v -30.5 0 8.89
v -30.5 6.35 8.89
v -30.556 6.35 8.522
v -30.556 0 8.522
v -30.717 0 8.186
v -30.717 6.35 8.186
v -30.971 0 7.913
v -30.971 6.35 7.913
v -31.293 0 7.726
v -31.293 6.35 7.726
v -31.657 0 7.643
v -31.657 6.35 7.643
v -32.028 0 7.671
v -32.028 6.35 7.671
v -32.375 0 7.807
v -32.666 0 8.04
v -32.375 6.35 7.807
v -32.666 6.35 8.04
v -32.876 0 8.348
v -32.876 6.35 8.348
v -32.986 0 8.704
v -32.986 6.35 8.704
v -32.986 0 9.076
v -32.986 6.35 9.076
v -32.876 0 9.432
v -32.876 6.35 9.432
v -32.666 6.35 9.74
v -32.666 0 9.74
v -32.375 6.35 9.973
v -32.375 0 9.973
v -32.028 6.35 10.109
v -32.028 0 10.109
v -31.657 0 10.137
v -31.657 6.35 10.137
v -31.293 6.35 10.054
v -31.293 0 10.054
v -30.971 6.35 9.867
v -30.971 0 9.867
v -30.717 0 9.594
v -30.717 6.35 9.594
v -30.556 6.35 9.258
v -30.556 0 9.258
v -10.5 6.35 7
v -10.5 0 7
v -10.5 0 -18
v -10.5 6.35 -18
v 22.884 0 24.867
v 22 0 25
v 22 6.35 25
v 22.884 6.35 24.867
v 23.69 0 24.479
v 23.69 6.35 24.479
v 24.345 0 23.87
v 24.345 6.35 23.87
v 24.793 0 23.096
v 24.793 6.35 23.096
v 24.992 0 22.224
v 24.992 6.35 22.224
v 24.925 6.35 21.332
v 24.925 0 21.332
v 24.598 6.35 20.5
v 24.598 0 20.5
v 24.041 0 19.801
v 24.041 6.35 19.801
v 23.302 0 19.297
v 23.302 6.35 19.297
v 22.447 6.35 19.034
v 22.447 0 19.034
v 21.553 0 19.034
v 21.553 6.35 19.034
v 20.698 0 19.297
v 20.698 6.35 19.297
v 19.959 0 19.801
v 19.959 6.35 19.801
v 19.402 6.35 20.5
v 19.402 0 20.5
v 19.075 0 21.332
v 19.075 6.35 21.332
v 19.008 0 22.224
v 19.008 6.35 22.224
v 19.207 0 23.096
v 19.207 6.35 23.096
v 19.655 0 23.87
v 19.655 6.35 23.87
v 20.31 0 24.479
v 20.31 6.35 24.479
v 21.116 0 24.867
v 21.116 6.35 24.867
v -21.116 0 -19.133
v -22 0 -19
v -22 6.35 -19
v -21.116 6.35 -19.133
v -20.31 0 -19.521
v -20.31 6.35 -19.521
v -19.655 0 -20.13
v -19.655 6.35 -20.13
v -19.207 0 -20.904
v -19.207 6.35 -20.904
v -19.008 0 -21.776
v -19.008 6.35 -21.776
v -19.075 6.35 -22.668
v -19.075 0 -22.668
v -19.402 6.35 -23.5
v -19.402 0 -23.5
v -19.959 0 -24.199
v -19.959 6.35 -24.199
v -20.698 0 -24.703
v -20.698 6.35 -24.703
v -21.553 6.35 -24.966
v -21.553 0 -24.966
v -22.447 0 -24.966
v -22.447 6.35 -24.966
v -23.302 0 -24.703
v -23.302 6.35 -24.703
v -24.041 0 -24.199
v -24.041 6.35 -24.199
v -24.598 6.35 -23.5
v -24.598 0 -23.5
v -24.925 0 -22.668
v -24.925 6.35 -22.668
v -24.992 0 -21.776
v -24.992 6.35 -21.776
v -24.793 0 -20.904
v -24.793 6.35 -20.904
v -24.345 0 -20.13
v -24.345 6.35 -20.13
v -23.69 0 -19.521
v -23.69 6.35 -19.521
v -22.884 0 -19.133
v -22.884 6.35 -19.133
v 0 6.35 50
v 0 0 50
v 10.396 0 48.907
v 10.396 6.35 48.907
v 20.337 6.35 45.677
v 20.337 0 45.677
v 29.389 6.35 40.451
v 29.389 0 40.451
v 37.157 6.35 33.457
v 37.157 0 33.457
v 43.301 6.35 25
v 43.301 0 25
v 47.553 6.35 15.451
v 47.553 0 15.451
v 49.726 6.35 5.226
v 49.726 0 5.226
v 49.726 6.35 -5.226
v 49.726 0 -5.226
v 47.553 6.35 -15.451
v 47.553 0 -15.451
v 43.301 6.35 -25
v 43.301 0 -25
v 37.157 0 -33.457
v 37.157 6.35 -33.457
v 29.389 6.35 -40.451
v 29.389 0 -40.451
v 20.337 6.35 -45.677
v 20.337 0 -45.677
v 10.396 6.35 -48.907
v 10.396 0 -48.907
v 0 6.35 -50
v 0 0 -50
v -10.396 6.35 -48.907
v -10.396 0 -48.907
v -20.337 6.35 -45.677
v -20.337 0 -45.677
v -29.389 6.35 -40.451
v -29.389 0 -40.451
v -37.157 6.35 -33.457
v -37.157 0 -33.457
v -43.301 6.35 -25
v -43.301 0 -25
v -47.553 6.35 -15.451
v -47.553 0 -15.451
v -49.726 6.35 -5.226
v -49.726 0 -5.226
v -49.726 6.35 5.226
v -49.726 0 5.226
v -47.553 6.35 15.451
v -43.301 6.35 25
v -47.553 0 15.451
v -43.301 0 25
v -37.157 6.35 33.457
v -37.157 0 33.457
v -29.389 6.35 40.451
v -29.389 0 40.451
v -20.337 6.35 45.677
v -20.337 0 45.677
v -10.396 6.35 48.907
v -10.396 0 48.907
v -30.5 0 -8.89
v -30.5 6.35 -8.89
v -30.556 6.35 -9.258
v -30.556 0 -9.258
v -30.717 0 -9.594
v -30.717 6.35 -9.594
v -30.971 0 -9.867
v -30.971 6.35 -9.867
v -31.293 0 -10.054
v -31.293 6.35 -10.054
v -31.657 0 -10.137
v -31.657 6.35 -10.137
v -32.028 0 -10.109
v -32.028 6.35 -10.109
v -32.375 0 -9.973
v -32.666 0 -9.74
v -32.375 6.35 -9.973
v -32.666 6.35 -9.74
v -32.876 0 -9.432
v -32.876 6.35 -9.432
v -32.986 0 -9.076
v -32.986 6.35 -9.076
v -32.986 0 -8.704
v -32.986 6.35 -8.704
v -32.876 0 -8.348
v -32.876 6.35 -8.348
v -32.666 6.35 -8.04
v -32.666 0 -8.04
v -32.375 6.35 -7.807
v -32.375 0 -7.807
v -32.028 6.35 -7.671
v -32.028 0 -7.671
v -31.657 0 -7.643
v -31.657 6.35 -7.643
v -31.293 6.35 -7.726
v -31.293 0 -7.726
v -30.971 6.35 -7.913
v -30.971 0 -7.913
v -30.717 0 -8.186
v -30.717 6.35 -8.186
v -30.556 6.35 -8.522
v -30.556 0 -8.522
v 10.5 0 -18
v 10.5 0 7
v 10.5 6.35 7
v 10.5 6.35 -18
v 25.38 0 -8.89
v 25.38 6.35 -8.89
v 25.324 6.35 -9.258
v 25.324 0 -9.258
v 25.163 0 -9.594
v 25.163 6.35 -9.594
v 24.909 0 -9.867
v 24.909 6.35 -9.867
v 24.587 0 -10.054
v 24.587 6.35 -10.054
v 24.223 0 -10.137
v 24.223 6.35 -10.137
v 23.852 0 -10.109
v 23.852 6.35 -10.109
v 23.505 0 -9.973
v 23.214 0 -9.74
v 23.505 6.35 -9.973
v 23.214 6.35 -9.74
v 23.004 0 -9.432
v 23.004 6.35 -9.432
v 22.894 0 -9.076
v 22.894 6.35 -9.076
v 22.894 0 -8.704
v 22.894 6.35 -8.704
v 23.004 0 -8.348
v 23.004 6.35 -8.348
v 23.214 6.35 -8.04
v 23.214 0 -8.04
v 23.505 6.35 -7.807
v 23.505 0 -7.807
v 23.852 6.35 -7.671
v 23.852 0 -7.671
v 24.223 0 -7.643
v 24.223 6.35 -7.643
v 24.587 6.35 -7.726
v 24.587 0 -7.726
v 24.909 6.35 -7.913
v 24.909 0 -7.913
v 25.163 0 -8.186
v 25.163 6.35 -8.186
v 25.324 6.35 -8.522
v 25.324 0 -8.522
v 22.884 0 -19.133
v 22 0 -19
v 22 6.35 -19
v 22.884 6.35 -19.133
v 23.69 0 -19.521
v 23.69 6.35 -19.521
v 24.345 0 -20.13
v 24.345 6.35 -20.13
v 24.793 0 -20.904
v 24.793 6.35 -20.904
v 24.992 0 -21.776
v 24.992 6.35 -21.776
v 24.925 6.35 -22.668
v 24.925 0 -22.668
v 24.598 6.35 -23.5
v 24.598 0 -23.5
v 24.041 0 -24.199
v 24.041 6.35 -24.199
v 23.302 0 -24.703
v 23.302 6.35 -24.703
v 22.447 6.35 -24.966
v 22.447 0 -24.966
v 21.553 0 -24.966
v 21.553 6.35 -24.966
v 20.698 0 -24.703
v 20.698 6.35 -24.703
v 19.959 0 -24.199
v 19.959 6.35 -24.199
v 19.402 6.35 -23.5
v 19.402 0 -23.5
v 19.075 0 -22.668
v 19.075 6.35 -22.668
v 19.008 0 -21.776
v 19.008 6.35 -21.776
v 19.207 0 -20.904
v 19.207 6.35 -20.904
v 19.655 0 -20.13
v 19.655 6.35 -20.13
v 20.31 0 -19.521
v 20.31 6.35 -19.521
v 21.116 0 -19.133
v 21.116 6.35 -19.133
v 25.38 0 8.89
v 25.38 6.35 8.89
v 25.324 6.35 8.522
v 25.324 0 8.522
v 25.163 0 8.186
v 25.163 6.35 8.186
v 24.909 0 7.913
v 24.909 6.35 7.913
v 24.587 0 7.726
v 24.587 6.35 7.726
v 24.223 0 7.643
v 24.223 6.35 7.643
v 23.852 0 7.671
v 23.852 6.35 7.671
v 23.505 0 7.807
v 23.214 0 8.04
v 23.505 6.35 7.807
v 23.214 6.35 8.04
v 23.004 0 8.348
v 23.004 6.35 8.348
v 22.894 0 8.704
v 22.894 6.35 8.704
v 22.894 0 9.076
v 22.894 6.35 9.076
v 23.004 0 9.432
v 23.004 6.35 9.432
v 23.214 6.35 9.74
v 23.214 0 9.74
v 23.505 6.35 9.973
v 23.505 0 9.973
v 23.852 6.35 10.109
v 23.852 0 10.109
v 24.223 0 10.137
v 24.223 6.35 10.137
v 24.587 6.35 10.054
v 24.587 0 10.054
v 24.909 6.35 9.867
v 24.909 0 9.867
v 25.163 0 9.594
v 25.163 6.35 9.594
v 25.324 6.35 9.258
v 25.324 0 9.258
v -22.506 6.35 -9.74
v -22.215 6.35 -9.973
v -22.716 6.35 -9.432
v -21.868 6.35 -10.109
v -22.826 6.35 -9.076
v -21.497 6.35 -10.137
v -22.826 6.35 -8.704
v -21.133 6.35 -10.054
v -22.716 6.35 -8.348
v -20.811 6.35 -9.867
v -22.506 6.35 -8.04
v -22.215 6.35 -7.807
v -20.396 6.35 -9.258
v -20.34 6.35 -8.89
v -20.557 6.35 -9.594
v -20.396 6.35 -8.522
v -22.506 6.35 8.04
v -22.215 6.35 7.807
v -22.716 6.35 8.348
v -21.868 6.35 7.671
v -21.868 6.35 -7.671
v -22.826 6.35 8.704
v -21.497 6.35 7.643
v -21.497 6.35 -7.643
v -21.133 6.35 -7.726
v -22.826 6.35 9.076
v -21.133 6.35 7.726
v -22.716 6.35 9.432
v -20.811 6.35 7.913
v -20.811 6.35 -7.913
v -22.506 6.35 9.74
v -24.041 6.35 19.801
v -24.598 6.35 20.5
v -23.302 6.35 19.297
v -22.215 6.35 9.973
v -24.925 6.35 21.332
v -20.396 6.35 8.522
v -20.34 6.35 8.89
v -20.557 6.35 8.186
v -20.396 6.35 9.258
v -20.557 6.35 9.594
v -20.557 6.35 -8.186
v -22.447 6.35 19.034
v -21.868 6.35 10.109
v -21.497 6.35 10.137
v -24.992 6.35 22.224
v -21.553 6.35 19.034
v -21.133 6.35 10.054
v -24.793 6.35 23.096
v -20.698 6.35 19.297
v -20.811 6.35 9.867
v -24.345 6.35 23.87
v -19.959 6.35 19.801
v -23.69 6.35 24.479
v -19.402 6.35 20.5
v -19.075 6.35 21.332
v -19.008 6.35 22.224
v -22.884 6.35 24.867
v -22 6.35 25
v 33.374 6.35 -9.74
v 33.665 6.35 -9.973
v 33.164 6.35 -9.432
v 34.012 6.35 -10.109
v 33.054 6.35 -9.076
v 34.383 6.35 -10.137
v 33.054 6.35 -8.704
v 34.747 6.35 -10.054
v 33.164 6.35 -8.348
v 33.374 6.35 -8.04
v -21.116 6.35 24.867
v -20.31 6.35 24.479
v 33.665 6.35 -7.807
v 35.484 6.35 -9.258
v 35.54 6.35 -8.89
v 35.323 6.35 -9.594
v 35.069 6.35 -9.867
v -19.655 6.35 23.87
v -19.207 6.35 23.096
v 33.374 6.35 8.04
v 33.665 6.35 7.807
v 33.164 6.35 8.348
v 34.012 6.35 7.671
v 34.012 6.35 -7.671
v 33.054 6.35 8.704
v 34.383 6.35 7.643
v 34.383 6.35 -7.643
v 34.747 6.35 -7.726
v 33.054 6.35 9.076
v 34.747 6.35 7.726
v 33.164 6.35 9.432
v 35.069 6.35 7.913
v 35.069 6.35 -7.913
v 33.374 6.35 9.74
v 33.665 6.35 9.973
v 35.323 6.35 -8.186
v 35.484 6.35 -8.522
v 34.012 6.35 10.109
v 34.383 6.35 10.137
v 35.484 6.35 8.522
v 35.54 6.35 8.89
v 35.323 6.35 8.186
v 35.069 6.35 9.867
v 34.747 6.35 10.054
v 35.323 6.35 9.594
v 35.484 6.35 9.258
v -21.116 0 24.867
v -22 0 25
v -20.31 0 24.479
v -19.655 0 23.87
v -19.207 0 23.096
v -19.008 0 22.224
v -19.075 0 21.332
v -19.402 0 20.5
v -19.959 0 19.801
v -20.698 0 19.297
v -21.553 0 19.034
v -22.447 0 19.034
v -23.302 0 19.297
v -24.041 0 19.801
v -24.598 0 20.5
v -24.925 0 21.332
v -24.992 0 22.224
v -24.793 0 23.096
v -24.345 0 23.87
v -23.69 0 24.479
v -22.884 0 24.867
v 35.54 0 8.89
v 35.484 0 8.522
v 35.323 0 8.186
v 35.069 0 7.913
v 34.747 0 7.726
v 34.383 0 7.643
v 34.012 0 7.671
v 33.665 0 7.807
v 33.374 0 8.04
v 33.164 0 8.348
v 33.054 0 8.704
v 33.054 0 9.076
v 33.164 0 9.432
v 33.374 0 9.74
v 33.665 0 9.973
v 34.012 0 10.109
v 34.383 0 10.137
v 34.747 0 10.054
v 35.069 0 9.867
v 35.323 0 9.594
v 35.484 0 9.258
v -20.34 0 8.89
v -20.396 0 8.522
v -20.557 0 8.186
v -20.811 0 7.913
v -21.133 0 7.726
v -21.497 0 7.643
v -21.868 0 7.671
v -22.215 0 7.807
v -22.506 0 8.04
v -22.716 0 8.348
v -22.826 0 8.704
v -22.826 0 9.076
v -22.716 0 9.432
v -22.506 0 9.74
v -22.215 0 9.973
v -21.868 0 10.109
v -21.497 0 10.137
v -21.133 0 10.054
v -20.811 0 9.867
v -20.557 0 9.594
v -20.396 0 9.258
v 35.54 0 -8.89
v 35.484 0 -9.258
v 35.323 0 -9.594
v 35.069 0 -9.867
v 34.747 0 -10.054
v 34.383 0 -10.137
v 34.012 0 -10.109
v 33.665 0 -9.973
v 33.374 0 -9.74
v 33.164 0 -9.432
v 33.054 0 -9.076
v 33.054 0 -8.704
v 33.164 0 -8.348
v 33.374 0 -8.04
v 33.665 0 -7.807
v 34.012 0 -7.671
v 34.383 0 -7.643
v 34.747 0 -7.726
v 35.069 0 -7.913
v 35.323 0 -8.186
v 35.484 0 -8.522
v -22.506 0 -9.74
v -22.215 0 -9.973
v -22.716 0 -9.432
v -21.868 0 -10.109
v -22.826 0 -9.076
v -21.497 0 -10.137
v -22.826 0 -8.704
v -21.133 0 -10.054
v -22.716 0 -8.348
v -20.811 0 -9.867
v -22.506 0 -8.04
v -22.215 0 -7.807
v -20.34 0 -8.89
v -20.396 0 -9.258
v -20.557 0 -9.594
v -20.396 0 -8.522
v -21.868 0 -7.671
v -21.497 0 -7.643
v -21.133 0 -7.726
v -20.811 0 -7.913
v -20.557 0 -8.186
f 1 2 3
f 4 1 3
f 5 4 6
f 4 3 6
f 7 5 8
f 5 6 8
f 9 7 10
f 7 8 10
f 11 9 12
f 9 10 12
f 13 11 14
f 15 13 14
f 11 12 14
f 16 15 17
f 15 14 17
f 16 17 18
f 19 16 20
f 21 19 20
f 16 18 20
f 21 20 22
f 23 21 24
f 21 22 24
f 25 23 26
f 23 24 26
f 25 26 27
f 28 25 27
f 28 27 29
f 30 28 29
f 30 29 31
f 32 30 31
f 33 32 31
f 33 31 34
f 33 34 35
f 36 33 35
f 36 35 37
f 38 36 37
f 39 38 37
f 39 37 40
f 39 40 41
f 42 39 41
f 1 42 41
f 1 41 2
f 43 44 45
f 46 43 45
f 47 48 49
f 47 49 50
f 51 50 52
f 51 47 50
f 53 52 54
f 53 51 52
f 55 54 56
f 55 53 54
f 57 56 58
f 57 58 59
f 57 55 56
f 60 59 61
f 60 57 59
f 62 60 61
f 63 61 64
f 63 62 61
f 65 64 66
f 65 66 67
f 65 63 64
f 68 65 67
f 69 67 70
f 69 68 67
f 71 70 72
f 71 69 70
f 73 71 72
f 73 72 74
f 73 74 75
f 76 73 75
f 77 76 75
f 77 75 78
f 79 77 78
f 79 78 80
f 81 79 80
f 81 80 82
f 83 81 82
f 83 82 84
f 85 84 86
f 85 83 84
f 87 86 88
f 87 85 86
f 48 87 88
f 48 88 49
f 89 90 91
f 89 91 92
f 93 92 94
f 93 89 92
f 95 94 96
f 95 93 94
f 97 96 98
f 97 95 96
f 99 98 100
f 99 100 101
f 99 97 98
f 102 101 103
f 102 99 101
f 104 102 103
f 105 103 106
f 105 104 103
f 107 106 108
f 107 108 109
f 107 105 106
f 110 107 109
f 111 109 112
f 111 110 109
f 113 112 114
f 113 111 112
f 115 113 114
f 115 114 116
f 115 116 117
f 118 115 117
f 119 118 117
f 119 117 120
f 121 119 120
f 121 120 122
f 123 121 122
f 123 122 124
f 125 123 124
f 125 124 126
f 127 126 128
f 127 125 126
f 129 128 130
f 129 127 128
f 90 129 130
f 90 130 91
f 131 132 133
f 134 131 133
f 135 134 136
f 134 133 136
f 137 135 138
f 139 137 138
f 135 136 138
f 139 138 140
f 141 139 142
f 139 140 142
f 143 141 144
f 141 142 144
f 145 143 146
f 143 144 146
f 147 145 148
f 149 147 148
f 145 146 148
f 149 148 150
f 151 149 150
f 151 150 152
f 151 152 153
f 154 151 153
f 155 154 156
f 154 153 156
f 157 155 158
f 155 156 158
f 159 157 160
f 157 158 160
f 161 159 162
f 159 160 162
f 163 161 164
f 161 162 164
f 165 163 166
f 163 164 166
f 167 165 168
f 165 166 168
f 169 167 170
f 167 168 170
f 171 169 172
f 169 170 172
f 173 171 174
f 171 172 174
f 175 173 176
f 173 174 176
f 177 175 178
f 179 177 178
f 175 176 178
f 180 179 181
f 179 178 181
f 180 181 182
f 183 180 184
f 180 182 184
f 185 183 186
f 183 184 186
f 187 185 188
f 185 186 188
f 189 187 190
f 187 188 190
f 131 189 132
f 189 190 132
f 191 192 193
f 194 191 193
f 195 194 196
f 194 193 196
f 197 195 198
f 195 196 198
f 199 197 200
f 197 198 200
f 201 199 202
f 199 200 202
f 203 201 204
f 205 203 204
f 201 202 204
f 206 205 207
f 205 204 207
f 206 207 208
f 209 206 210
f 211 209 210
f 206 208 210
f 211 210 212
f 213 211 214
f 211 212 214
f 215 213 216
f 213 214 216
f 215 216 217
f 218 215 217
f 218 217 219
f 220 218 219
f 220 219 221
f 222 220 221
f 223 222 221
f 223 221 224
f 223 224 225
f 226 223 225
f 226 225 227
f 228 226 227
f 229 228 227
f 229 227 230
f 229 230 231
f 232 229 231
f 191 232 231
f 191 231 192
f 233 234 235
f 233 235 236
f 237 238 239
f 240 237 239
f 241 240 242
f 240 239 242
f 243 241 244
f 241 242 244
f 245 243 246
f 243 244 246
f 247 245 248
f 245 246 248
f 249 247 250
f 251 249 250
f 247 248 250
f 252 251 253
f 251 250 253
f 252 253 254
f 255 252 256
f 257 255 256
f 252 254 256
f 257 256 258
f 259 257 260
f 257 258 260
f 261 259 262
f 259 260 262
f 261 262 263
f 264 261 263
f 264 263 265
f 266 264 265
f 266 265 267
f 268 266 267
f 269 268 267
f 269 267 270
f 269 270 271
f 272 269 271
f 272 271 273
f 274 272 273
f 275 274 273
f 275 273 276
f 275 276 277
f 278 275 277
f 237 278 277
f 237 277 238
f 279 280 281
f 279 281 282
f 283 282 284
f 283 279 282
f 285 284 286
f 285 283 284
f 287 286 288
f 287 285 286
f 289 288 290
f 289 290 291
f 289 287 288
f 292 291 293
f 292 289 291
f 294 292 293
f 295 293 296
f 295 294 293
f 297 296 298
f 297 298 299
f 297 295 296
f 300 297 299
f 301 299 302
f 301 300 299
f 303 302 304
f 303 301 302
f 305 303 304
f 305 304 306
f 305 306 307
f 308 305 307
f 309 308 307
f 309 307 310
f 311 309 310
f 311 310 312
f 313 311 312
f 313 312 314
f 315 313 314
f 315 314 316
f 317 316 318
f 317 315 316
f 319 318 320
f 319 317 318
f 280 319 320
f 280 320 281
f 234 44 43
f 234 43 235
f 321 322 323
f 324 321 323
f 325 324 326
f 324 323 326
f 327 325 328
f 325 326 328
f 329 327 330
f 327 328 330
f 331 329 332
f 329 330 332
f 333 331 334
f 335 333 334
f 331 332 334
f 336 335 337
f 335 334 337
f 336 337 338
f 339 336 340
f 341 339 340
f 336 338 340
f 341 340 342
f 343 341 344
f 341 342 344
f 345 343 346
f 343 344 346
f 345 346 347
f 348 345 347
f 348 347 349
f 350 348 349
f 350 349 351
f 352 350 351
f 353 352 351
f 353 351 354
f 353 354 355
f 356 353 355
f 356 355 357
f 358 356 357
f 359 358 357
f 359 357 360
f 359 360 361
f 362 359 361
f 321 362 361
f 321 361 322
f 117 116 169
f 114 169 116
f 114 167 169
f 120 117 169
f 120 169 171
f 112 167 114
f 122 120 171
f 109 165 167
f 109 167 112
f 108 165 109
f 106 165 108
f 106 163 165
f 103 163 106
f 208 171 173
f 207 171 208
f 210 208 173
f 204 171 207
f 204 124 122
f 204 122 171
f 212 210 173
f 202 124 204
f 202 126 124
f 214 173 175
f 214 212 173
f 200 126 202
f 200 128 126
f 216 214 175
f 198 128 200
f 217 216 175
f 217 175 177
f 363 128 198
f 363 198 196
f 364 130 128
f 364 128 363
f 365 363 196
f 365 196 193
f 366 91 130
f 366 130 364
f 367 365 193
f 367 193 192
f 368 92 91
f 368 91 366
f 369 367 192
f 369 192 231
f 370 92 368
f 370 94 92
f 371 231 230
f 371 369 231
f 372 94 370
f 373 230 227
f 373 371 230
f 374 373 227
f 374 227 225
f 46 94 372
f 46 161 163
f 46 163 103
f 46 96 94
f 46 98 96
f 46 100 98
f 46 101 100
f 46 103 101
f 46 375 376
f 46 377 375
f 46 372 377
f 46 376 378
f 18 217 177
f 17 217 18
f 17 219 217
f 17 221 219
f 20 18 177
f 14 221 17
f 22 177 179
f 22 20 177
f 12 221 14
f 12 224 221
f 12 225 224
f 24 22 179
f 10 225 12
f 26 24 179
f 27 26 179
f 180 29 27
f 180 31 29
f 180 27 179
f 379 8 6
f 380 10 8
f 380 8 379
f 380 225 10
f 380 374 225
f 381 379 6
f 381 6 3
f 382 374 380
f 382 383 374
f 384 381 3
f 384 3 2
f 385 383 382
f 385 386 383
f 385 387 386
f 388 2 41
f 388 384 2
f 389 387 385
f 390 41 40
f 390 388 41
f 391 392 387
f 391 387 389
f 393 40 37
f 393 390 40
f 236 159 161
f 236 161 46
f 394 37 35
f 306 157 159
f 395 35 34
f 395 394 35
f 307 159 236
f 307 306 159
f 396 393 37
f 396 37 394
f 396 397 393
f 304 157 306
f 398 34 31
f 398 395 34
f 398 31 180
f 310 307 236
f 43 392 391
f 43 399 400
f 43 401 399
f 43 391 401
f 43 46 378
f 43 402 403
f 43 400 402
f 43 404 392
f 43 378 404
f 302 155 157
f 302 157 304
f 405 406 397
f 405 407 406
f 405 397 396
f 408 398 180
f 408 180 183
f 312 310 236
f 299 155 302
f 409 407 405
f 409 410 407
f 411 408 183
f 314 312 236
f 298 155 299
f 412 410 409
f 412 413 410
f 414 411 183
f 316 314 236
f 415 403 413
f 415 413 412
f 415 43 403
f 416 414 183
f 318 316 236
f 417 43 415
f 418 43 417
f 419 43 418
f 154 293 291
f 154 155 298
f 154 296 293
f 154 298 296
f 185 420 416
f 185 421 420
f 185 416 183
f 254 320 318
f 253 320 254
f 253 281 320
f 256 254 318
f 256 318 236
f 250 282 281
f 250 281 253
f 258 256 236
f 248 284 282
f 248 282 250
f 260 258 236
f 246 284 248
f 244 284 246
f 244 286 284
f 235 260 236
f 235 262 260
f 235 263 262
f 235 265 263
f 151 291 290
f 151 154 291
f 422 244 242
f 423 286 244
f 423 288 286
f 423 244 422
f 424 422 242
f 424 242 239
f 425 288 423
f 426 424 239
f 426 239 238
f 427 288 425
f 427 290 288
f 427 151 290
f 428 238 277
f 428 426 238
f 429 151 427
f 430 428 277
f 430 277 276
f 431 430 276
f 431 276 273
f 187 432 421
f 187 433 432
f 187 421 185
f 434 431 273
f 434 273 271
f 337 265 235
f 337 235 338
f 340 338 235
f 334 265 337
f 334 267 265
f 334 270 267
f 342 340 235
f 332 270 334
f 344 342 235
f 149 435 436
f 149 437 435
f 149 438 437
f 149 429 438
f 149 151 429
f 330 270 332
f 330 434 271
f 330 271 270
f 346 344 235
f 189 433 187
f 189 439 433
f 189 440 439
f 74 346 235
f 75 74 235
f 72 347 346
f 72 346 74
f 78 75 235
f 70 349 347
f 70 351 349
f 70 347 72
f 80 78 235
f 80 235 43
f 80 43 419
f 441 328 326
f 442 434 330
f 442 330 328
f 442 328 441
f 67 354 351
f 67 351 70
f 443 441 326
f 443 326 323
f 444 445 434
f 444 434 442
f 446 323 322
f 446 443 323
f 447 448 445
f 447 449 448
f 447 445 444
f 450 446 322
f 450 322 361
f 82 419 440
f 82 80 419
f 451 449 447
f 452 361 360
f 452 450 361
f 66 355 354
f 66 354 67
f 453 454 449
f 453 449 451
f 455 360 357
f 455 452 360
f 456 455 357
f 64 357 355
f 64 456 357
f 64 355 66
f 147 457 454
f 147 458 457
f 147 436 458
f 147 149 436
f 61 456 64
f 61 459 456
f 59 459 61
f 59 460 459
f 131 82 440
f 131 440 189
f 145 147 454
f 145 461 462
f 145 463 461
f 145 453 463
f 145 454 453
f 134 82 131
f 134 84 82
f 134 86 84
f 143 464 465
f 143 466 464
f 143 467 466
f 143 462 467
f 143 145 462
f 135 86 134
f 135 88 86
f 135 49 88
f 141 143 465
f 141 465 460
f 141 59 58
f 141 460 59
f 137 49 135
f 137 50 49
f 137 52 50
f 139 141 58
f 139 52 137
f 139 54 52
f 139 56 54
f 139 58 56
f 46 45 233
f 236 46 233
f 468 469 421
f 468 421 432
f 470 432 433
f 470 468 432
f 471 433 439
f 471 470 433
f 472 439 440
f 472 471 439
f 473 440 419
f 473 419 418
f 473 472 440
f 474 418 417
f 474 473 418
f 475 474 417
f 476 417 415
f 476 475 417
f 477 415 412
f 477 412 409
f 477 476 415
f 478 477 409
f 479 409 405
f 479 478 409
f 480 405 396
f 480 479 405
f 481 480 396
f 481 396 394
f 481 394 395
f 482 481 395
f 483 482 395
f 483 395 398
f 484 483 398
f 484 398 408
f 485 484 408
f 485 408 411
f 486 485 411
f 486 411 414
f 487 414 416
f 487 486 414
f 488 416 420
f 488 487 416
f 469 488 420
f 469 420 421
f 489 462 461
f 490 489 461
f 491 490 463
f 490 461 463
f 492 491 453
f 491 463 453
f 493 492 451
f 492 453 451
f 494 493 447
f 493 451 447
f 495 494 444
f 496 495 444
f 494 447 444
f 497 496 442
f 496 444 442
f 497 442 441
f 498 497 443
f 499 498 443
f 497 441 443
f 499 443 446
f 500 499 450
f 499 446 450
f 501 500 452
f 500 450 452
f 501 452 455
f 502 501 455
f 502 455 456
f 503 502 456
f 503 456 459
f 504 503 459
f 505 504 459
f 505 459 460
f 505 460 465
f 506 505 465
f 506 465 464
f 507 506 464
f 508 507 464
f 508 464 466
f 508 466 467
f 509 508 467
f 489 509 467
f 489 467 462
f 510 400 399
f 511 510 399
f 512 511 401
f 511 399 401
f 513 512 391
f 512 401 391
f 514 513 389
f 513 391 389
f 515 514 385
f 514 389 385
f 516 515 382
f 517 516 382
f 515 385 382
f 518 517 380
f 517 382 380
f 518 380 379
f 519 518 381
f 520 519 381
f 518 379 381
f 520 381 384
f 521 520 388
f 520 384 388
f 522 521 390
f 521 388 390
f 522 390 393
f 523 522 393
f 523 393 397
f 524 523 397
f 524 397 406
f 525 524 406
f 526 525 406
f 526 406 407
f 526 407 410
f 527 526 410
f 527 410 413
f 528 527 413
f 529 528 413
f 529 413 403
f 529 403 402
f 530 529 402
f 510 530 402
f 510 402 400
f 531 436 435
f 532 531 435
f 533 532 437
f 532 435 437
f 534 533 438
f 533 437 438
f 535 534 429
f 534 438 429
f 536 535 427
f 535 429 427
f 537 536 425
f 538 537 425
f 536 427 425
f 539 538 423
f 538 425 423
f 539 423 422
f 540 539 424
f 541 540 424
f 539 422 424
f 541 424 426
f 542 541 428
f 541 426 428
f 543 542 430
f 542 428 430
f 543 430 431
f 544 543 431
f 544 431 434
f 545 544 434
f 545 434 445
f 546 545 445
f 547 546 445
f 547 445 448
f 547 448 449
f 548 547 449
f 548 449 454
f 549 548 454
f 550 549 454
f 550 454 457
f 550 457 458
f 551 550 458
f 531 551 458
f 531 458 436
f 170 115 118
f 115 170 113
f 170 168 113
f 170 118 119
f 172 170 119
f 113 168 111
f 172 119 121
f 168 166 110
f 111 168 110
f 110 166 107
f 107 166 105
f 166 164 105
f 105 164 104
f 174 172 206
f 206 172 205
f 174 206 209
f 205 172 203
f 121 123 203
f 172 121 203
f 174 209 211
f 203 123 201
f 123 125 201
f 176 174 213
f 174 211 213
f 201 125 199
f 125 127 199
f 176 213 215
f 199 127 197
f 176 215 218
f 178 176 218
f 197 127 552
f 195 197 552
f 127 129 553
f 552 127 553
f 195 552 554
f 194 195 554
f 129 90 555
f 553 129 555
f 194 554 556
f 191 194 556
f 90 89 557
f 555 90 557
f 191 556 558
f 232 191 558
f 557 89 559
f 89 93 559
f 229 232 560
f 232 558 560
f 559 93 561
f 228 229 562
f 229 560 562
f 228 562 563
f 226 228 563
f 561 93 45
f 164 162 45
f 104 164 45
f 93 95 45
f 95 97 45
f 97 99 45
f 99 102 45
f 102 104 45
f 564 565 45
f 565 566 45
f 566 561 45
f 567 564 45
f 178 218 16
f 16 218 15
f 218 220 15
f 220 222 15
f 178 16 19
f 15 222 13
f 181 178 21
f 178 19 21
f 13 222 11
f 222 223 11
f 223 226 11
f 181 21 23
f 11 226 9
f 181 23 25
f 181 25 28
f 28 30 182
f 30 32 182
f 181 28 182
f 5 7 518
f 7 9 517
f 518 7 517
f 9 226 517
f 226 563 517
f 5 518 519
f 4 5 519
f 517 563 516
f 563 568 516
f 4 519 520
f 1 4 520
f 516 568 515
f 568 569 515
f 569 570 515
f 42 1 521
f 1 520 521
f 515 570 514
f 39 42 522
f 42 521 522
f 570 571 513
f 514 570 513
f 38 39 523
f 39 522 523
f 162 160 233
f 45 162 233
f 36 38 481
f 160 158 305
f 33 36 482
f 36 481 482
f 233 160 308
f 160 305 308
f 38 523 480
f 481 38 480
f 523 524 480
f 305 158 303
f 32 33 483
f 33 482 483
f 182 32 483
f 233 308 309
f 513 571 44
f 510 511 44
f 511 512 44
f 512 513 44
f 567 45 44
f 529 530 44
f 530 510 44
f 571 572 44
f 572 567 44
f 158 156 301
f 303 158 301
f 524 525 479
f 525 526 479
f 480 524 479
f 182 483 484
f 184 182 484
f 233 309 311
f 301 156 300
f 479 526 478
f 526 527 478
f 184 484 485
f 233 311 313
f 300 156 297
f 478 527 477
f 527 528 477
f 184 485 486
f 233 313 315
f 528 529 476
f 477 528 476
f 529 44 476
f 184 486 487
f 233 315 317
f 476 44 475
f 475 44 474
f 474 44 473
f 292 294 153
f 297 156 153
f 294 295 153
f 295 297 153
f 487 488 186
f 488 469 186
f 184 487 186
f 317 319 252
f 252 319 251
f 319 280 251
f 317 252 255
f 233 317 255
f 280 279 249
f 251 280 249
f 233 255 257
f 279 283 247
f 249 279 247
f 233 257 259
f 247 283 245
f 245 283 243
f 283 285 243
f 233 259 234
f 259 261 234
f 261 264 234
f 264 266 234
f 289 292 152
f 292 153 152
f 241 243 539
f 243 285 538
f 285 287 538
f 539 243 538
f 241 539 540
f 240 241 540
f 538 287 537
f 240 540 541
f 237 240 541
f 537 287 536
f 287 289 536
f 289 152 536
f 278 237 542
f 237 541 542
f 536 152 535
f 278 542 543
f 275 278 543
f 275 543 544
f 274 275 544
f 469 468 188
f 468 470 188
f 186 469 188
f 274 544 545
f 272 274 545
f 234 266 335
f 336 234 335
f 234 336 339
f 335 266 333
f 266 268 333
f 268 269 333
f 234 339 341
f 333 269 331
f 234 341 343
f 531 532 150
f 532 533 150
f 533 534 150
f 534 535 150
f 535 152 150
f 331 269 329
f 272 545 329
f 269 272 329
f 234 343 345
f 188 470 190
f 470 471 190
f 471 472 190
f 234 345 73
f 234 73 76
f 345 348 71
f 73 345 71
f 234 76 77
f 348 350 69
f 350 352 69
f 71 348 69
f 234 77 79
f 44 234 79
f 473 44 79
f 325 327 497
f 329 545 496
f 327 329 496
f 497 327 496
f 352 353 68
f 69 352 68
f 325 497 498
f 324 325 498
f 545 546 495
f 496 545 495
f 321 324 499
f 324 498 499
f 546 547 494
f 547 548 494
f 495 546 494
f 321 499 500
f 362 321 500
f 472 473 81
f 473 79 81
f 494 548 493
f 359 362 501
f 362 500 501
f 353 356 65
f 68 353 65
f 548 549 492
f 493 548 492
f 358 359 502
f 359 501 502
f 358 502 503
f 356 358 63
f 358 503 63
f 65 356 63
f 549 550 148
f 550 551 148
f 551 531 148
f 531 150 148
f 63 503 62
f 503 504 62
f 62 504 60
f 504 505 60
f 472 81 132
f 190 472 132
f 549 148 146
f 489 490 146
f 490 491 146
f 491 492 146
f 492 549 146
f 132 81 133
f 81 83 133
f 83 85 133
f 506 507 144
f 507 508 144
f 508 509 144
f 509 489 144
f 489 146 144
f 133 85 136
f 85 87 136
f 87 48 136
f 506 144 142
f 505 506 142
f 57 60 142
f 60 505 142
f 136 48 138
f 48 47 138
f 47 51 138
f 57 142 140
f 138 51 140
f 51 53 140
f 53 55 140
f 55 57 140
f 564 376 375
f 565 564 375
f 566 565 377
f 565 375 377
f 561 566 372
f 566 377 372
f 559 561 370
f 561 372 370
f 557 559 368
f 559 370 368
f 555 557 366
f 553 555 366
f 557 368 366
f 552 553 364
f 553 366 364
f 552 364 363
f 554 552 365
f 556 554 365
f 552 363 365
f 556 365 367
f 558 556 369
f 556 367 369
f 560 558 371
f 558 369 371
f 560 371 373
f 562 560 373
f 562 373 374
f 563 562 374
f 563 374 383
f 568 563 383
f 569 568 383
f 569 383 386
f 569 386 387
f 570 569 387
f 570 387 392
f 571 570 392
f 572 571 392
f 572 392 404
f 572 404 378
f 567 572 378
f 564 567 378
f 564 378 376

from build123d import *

# Parameters (mm, degrees)
SKETCH1_R             = 50
SKETCH1_R_2           = 3
SKETCH1_W             = 21
SKETCH1_H             = 25
BOSS_EXTRUDE1_DEPTH   = 6.35
M3X0_5_TAPPED_HOLE1_D = 2.5


with BuildPart() as part:
    # Sketch1 → Boss-Extrude1 (new body)
    with BuildSketch(Plane(origin=(0, 0, 0), x_dir=(1, 0, 0), z_dir=(0, 1, 0))):
        with Locations(Location((0, 0, 0), (0, 0, 270))):
            Circle(SKETCH1_R)
        with Locations(Location((22, 22, 0), (0, 0, 270))):
            Circle(SKETCH1_R_2, mode=Mode.SUBTRACT)
        with Locations(Location((-22, 22, 0), (0, 0, 270))):
            Circle(SKETCH1_R_2, mode=Mode.SUBTRACT)
        with Locations(Location((-22, -22, 0), (0, 0, 270))):
            Circle(SKETCH1_R_2, mode=Mode.SUBTRACT)
        with Locations(Location((22, -22, 0), (0, 0, 270))):
            Circle(SKETCH1_R_2, mode=Mode.SUBTRACT)
        with Locations((0, 5.5)):
            Rectangle(SKETCH1_W, SKETCH1_H, mode=Mode.SUBTRACT)
    extrude(amount=BOSS_EXTRUDE1_DEPTH)

    # M3x0.5 Tapped Hole1 (through all)
    with Locations(Plane(origin=(0, 0, 0), x_dir=(-1, 0, 0), z_dir=(0, -1, 0))):
        with Locations((21.59, 8.89), (-24.13, 8.89), (-24.13, -8.89), (21.59, -8.89), (31.75, 8.89), (-34.29, 8.89), (31.75, -8.89), (-34.29, -8.89)):
            Hole(M3X0_5_TAPPED_HOLE1_D / 2)


solid = part.part
